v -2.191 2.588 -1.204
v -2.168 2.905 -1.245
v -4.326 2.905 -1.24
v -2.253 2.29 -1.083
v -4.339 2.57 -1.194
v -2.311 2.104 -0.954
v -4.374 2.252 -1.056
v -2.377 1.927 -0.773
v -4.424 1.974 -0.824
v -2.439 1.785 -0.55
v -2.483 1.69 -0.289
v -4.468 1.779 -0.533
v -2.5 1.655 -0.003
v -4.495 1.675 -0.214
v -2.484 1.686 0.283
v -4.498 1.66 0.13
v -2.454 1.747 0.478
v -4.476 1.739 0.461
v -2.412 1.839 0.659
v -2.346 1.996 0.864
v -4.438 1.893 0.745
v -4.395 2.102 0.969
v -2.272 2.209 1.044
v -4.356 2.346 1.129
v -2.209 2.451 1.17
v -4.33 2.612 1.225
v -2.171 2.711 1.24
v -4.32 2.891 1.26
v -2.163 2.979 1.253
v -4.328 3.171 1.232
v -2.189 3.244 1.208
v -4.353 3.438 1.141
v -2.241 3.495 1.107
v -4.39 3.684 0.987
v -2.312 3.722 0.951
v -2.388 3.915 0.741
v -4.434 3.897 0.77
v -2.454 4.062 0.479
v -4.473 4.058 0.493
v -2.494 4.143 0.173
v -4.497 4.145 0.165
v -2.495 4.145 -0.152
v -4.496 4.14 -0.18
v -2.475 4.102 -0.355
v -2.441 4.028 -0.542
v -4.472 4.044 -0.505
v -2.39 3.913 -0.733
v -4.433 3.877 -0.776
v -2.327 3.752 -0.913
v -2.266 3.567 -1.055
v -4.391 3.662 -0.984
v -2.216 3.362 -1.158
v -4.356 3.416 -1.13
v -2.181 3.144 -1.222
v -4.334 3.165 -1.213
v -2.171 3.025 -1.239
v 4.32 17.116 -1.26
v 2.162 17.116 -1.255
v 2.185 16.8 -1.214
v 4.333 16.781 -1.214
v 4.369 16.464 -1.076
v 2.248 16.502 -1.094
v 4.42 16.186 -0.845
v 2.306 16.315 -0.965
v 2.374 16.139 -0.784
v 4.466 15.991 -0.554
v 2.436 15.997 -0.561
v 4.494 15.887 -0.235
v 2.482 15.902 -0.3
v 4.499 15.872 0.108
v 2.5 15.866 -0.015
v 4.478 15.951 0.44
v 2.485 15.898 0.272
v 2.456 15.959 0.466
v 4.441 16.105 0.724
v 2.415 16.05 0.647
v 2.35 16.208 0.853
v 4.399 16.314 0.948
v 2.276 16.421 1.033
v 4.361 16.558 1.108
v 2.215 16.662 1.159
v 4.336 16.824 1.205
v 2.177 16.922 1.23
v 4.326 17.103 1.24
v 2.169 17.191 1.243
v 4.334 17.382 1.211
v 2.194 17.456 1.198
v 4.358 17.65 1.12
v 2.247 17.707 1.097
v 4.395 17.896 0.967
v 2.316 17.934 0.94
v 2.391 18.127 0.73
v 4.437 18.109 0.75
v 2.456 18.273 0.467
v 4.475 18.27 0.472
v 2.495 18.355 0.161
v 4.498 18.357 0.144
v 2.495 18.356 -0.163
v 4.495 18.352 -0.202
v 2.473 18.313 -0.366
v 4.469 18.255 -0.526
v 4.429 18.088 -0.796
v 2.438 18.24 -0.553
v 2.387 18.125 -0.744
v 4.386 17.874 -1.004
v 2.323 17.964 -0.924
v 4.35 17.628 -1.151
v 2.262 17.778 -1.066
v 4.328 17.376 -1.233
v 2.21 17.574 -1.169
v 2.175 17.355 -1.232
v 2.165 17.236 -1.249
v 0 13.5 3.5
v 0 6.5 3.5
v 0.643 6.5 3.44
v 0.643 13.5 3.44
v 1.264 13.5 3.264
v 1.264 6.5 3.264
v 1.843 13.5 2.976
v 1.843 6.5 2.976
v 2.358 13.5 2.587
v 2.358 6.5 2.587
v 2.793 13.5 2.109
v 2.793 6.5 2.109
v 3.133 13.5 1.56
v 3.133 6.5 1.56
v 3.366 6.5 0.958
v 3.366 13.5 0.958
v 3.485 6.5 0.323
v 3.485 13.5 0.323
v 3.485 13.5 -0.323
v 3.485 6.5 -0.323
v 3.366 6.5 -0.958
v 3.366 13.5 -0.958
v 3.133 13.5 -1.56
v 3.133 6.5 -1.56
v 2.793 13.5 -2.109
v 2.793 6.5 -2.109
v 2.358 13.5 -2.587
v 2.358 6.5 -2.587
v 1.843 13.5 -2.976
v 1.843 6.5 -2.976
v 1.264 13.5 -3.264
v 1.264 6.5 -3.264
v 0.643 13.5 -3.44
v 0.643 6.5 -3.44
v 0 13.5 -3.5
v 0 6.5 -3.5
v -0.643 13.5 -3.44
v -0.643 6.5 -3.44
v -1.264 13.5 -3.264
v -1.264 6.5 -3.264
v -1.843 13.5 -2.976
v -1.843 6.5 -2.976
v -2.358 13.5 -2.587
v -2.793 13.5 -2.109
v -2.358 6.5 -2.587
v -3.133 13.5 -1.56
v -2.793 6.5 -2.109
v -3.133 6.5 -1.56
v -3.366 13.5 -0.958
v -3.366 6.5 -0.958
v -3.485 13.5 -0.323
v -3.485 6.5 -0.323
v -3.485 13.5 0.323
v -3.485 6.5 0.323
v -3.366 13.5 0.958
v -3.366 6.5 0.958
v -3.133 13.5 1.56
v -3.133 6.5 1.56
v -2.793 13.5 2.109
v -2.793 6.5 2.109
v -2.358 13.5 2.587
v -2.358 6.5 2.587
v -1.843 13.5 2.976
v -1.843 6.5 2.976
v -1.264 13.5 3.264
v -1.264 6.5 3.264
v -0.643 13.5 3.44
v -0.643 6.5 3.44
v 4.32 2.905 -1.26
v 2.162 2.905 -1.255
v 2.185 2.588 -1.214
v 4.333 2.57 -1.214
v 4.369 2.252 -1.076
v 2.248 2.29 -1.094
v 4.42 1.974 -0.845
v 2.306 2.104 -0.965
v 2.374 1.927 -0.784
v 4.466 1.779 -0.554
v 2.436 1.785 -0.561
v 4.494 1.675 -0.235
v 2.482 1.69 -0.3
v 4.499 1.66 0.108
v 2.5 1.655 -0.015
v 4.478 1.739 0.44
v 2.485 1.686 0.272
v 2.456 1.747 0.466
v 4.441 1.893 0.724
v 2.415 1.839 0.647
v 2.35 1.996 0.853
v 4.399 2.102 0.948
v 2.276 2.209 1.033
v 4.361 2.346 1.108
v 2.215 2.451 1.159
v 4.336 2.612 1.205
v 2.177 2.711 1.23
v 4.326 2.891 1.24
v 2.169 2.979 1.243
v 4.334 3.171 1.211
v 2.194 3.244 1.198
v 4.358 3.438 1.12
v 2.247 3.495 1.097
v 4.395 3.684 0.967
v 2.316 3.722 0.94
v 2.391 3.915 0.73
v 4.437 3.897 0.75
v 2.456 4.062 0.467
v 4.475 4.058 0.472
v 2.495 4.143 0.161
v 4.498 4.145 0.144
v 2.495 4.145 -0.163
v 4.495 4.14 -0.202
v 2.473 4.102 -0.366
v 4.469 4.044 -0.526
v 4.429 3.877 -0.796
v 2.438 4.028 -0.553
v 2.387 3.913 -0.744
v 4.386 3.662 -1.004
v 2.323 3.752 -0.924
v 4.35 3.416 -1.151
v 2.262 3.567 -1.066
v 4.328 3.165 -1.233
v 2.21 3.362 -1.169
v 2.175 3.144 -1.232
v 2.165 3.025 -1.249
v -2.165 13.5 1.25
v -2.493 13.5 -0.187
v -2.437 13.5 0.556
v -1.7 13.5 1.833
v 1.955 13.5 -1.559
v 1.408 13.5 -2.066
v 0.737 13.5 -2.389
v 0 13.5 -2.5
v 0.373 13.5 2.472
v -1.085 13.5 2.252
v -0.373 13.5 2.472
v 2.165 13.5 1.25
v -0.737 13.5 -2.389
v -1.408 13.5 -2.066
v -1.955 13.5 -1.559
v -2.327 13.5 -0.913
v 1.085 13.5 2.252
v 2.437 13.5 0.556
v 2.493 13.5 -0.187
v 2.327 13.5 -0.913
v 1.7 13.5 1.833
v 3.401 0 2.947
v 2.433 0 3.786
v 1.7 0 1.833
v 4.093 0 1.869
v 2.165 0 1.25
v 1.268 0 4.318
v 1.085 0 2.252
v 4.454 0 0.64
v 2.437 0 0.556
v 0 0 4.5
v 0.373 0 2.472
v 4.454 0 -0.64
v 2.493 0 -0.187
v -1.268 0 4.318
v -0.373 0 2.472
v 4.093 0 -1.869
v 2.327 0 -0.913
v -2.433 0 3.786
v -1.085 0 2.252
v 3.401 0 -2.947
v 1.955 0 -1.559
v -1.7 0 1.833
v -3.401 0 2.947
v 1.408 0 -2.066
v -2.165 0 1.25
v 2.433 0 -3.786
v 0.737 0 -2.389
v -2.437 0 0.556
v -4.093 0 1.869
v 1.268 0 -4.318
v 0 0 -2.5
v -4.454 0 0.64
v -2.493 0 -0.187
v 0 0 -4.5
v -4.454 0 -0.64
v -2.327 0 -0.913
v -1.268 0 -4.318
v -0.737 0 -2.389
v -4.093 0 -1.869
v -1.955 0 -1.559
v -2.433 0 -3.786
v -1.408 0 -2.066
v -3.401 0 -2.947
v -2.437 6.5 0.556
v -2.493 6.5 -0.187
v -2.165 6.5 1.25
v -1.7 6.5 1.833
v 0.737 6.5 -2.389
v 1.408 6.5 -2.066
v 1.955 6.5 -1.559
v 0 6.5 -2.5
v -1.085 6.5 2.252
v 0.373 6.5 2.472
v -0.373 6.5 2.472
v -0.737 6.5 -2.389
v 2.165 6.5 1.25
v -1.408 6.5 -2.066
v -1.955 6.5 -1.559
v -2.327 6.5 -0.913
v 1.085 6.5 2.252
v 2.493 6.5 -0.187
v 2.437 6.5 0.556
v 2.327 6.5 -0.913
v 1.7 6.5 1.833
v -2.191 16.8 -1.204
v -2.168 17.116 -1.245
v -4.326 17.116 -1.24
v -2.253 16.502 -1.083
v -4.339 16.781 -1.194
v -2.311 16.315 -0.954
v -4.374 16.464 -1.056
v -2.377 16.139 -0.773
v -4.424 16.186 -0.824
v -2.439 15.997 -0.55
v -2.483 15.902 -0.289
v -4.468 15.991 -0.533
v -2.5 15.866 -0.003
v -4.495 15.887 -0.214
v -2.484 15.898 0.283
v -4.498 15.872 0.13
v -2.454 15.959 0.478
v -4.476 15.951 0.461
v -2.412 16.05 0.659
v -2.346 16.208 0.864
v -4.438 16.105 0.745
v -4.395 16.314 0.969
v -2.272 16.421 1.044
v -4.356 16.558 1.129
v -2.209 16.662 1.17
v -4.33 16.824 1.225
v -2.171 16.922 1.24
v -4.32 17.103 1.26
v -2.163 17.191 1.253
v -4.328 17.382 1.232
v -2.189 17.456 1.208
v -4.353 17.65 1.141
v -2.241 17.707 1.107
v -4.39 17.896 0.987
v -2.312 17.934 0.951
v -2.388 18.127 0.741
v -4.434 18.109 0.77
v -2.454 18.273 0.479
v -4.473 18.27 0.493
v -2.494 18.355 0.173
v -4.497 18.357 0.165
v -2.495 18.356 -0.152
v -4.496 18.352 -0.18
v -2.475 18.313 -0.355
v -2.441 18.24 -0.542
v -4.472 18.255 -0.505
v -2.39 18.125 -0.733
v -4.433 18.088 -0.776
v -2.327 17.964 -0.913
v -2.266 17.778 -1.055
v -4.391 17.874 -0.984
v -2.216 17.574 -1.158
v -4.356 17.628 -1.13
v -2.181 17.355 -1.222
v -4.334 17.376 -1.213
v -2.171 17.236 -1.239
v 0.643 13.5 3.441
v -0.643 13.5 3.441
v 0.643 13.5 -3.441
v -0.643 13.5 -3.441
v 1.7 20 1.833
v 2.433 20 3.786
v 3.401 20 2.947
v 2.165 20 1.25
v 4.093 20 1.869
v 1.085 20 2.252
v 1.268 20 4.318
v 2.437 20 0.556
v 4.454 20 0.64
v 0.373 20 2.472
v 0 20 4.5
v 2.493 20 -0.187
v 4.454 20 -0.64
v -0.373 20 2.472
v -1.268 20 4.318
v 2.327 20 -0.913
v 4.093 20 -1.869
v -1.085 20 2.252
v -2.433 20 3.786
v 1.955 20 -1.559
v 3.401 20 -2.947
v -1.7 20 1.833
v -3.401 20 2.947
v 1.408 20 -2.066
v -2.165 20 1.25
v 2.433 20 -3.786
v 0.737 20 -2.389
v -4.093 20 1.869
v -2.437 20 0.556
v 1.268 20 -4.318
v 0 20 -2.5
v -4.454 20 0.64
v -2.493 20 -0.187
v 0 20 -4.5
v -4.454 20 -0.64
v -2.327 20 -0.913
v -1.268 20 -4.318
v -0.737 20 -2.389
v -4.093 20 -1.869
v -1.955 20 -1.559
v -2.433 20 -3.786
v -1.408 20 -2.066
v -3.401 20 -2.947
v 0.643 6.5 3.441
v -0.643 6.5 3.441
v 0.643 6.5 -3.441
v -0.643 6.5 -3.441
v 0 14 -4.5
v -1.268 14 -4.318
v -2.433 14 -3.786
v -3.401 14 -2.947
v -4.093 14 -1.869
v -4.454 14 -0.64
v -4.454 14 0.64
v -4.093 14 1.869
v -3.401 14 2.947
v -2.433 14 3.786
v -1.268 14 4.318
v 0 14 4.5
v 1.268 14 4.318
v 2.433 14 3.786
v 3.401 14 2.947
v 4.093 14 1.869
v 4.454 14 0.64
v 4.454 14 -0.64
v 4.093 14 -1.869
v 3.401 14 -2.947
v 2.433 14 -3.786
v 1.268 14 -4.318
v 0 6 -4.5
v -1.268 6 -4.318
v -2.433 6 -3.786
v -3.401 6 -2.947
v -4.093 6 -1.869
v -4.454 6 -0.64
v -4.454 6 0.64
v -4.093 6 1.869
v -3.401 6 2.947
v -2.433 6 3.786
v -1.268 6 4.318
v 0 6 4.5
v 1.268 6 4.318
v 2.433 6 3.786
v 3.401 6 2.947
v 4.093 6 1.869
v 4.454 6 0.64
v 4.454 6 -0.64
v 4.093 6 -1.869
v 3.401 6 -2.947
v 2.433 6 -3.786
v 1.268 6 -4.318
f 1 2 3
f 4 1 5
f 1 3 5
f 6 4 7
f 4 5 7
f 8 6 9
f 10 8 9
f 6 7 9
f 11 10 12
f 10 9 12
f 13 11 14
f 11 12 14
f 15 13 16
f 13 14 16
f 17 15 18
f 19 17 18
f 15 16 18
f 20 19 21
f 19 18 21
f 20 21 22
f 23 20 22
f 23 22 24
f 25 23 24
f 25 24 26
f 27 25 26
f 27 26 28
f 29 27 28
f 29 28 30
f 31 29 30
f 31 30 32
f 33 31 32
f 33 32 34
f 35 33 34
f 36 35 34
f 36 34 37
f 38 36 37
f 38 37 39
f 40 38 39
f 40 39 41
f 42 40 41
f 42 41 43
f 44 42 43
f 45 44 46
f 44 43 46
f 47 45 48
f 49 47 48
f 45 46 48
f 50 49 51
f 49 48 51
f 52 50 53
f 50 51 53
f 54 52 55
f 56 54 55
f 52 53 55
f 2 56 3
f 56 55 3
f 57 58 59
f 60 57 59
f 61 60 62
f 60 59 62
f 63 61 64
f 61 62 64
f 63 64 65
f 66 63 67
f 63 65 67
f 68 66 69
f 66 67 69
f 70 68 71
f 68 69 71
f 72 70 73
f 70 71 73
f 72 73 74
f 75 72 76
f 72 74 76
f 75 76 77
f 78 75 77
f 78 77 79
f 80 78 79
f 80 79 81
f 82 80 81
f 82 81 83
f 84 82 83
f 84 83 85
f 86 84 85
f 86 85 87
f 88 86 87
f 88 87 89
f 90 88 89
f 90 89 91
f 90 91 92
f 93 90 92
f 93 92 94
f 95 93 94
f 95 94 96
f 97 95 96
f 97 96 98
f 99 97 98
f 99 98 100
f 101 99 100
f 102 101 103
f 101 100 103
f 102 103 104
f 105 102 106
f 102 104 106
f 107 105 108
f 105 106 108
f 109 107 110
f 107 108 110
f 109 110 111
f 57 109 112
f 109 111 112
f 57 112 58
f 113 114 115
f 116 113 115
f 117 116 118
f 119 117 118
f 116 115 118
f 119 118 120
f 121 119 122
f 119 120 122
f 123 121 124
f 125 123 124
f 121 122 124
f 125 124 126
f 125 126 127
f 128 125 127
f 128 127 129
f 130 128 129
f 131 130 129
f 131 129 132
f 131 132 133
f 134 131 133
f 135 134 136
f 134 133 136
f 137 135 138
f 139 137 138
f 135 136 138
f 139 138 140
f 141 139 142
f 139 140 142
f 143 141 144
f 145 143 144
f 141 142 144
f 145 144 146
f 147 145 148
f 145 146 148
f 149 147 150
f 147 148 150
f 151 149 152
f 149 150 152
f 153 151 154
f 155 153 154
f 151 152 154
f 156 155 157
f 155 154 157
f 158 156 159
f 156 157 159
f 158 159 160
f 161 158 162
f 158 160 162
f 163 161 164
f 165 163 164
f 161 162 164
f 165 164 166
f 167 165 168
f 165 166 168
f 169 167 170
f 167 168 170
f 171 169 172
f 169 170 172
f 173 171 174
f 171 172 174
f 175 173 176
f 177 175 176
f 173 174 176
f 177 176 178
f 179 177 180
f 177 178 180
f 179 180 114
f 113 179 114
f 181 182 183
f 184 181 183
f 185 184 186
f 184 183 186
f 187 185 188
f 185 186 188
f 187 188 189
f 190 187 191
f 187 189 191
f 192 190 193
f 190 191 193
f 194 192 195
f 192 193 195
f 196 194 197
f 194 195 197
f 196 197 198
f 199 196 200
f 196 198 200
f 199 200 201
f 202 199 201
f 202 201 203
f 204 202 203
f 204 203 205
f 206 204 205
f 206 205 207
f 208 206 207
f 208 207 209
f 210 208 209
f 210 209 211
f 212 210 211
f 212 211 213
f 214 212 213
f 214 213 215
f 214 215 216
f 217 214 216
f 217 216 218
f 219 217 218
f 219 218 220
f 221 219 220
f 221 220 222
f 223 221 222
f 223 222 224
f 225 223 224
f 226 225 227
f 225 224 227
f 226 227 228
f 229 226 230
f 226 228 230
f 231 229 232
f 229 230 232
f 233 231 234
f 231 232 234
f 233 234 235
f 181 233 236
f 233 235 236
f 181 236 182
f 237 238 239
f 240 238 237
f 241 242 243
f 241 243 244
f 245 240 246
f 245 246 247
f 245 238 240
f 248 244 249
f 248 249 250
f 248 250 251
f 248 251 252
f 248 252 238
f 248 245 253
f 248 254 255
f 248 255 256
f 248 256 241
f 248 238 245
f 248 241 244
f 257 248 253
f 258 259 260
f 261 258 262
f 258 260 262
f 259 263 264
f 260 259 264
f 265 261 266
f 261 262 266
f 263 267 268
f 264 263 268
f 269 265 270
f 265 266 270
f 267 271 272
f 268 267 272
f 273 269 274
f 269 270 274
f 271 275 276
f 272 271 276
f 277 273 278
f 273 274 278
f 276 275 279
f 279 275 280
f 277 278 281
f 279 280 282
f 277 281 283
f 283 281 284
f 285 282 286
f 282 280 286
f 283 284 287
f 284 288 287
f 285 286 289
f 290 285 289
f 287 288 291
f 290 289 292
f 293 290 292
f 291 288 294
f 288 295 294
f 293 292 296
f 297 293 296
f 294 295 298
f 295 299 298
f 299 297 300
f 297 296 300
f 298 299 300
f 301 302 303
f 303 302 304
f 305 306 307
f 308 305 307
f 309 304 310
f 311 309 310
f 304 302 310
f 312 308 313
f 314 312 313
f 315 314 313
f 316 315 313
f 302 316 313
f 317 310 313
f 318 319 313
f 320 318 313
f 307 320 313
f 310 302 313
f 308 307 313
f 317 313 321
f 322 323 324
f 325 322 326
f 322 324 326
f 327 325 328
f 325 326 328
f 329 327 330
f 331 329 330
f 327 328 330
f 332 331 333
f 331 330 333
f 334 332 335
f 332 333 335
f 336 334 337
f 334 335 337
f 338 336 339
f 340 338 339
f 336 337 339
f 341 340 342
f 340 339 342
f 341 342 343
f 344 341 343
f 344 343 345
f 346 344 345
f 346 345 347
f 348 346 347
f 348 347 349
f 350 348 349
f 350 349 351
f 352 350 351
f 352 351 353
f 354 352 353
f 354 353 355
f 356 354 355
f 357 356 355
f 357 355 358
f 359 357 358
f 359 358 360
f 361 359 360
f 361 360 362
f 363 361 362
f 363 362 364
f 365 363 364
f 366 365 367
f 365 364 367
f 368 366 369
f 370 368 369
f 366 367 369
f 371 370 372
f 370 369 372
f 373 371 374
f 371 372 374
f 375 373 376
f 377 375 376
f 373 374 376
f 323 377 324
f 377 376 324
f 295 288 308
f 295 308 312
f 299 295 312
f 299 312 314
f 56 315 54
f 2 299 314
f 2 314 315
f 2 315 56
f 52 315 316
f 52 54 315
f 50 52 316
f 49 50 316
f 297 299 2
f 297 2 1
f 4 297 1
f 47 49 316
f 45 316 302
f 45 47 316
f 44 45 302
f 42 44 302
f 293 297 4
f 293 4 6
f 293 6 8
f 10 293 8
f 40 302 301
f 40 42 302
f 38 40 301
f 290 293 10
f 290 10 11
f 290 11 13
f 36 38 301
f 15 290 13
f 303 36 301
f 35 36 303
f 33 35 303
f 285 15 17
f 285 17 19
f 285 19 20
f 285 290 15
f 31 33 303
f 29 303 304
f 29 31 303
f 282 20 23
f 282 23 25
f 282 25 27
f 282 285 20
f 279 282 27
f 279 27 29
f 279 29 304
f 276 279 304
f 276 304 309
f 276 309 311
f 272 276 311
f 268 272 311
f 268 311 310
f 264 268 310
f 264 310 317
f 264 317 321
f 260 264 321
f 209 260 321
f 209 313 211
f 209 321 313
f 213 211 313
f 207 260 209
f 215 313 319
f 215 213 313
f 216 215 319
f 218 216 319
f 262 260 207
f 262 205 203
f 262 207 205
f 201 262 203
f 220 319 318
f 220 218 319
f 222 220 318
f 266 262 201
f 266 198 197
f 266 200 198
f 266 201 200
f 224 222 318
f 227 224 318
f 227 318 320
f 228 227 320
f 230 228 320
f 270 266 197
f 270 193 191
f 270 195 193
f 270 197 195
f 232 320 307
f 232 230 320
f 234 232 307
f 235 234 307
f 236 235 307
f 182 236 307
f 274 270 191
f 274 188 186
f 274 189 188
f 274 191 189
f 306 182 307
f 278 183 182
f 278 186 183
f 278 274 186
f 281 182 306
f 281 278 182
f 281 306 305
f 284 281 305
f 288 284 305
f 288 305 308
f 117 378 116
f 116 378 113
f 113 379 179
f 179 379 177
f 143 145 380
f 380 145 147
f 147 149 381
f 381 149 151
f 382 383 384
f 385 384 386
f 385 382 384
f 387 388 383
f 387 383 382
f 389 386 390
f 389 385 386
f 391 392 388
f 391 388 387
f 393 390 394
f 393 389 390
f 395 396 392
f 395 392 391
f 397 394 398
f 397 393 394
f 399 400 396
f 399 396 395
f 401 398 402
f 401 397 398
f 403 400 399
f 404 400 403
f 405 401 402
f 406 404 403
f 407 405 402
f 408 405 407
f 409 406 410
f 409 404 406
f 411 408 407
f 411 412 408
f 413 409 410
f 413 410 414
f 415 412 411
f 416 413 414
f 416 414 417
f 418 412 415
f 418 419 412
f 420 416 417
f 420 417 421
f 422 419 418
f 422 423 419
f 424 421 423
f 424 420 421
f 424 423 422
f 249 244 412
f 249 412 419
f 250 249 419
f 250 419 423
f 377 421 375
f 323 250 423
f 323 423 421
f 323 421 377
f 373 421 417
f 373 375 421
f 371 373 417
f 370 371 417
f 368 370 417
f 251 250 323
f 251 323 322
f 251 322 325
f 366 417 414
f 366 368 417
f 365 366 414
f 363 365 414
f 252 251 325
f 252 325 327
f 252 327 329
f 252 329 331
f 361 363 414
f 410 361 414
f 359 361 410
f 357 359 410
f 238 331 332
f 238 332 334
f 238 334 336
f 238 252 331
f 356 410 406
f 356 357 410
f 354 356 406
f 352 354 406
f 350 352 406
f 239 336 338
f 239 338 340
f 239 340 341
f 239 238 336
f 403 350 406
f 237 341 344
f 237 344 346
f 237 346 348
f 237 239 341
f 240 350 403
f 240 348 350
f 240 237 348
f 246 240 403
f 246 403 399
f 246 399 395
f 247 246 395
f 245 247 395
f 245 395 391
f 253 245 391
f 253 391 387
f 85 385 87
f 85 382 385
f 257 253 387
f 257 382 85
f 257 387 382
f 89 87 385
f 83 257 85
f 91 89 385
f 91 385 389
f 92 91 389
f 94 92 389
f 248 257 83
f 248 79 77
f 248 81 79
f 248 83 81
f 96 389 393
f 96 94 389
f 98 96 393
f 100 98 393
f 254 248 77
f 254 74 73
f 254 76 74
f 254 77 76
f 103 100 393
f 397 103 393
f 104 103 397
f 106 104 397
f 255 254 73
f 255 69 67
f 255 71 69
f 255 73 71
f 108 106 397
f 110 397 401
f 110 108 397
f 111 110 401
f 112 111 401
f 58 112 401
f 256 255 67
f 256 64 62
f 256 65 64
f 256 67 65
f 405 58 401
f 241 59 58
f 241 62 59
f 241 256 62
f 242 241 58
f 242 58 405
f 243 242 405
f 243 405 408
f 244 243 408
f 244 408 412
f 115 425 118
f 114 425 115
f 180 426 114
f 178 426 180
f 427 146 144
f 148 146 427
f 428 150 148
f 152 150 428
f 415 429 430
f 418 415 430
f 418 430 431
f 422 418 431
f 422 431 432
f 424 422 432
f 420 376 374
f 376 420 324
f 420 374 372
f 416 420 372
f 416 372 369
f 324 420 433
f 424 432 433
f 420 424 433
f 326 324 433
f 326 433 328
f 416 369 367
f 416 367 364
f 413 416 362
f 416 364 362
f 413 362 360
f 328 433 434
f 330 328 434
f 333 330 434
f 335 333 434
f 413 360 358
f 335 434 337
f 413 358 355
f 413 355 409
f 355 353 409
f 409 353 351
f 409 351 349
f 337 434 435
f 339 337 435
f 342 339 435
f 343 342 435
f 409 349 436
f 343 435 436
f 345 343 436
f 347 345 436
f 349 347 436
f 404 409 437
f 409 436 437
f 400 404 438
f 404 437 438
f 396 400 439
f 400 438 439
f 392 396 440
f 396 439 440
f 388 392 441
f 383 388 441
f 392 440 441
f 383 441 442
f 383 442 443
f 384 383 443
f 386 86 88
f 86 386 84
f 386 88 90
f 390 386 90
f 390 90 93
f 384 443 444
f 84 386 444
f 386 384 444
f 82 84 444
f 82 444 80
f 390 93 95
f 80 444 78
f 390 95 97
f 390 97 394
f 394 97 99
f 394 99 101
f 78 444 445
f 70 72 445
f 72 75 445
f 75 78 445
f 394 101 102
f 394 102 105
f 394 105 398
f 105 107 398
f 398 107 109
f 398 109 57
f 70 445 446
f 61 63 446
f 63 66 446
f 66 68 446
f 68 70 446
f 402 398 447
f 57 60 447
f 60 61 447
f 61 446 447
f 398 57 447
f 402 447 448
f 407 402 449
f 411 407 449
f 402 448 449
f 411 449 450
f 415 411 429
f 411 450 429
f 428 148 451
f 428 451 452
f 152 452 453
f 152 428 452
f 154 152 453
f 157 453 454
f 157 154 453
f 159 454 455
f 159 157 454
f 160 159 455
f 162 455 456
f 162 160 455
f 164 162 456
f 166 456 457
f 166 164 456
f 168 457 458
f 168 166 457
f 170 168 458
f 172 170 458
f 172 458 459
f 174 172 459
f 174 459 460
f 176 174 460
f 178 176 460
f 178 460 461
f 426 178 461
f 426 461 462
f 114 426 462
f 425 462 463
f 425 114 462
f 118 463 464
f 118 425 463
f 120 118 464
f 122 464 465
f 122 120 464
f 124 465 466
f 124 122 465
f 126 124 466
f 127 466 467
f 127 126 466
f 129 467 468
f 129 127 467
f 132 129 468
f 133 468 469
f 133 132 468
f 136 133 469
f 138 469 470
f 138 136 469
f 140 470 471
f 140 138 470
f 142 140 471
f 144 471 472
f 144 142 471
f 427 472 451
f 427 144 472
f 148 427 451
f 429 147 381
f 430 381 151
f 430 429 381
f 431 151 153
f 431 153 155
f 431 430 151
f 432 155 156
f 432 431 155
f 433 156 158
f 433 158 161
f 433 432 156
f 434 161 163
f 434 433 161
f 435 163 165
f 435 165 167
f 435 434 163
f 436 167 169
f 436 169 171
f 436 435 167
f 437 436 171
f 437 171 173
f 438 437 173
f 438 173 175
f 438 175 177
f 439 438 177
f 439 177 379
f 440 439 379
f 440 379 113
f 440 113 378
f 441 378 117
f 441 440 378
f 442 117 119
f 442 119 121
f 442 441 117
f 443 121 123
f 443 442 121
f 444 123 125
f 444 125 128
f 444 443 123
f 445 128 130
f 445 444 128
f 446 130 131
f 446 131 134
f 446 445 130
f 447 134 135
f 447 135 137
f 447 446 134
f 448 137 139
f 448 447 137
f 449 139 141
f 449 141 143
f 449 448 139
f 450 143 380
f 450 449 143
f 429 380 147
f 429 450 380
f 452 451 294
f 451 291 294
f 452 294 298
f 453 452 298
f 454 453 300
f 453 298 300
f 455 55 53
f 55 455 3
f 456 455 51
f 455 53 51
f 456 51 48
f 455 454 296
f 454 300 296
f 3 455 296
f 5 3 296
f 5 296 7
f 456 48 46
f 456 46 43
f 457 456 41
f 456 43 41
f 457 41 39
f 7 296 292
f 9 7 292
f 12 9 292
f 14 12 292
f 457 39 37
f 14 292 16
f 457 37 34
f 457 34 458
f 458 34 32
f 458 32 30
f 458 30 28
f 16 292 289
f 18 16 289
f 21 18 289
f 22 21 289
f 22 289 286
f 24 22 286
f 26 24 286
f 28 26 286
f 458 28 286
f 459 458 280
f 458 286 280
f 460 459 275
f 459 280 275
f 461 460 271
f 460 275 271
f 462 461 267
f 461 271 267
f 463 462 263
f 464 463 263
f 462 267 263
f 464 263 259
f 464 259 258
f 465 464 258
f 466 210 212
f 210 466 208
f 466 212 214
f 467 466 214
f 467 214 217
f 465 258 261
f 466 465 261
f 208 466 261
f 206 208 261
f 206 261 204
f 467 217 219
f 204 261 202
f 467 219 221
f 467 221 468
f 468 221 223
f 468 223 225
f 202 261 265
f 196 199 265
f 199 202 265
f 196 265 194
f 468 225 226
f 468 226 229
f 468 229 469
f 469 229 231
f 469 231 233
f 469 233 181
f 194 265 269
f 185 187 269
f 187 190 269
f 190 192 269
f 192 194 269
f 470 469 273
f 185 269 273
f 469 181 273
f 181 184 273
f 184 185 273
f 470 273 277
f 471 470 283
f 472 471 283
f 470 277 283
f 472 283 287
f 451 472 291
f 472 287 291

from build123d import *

# Parameters (mm, degrees)
SKETCH_1_R         = 4.5
SKETCH_1_R_2       = 2.5
EXTRUDE_1_DEPTH    = 6.5
SKETCH_2_R         = 3.5
EXTRUDE_2_DEPTH    = 7
SKETCH_3_R         = 4.5
SKETCH_3_R_2       = 2.5
EXTRUDE_3_DEPTH    = 6.5
CHAMFER_1_SIZE2    = 1
CHAMFER_1_SIZE     = 0.5
CHAMFER_2_SIZE2    = 0.5
CHAMFER_2_SIZE     = 1
HOLE_WIZARD_M3_1_D = 2.5
HOLE_WIZARD_M3_2_D = 2.5


with BuildPart() as part:
    # 草图1 → 凸台-拉伸1 (new body)
    with BuildSketch(Plane(origin=(0, 0, 0), x_dir=(1, 0, 0), z_dir=(0, 1, 0))):
        with Locations(Location((0, 0, 0), (0, 0, 90))):
            Circle(SKETCH_1_R)
        with Locations(Location((0, 0, 0), (0, 0, 90))):
            Circle(SKETCH_1_R_2, mode=Mode.SUBTRACT)
    extrude(amount=EXTRUDE_1_DEPTH)

    # 草图2 → 凸台-拉伸2 (add)
    with BuildSketch(Plane(origin=(0, 6.5, 0), x_dir=(1, 0, 0), z_dir=(0, 1, 0))):
        with Locations(Location((0, 0, 0), (0, 0, 270))):
            Circle(SKETCH_2_R)
    extrude(amount=EXTRUDE_2_DEPTH)

    # 草图3 → 凸台-拉伸3 (add)
    with BuildSketch(Plane(origin=(0, 13.5, 0), x_dir=(1, 0, 0), z_dir=(0, 1, 0))):
        with Locations(Location((0, 0, 0), (0, 0, 90))):
            Circle(SKETCH_3_R)
        with Locations(Location((0, 0, 0), (0, 0, 90))):
            Circle(SKETCH_3_R_2, mode=Mode.SUBTRACT)
    extrude(amount=EXTRUDE_3_DEPTH)

    # 倒角1
    chamfer_1_edges = [part.edges().sort_by_distance(p)[0] for p in [
        (0, 6.5, 4.5),
    ]]
    chamfer_1_side = [part.faces().sort_by_distance(p)[0] for p in [
        (0, 6.49, 4.5),
    ]]
    chamfer(chamfer_1_edges, length=CHAMFER_1_SIZE - 0.0001, length2=CHAMFER_1_SIZE2 - 0.0001, reference=chamfer_1_side[0])  # a hair under: the kernel refuses the full size

    # 倒角2
    chamfer_2_edges = [part.edges().sort_by_distance(p)[0] for p in [
        (0, 13.5, 4.5),
    ]]
    chamfer_2_side = [part.faces().sort_by_distance(p)[0] for p in [
        (0, 13.5, 4.49),
    ]]
    chamfer(chamfer_2_edges, length=CHAMFER_2_SIZE - 0.0001, length2=CHAMFER_2_SIZE2 - 0.0001, reference=chamfer_2_side[0])  # a hair under: the kernel refuses the full size

    # M3 螺纹孔1 (through all)
    with Locations(Plane(origin=(4.499987687, 2.904707671, -0.01052714), x_dir=(0.002339364434, 0, 0.999997263683), z_dir=(0.999997263683, 0, -0.002339364434))):
        with Locations((0, 0)):
            Hole(HOLE_WIZARD_M3_1_D / 2)

    # M3 螺纹孔2 (through all)
    with Locations(Plane(origin=(4.499987687, 17.116346609, -0.01052714), x_dir=(0.002339364434, 0, 0.999997263683), z_dir=(0.999997263683, 0, -0.002339364434))):
        with Locations((0, 0)):
            Hole(HOLE_WIZARD_M3_2_D / 2)


solid = part.part
